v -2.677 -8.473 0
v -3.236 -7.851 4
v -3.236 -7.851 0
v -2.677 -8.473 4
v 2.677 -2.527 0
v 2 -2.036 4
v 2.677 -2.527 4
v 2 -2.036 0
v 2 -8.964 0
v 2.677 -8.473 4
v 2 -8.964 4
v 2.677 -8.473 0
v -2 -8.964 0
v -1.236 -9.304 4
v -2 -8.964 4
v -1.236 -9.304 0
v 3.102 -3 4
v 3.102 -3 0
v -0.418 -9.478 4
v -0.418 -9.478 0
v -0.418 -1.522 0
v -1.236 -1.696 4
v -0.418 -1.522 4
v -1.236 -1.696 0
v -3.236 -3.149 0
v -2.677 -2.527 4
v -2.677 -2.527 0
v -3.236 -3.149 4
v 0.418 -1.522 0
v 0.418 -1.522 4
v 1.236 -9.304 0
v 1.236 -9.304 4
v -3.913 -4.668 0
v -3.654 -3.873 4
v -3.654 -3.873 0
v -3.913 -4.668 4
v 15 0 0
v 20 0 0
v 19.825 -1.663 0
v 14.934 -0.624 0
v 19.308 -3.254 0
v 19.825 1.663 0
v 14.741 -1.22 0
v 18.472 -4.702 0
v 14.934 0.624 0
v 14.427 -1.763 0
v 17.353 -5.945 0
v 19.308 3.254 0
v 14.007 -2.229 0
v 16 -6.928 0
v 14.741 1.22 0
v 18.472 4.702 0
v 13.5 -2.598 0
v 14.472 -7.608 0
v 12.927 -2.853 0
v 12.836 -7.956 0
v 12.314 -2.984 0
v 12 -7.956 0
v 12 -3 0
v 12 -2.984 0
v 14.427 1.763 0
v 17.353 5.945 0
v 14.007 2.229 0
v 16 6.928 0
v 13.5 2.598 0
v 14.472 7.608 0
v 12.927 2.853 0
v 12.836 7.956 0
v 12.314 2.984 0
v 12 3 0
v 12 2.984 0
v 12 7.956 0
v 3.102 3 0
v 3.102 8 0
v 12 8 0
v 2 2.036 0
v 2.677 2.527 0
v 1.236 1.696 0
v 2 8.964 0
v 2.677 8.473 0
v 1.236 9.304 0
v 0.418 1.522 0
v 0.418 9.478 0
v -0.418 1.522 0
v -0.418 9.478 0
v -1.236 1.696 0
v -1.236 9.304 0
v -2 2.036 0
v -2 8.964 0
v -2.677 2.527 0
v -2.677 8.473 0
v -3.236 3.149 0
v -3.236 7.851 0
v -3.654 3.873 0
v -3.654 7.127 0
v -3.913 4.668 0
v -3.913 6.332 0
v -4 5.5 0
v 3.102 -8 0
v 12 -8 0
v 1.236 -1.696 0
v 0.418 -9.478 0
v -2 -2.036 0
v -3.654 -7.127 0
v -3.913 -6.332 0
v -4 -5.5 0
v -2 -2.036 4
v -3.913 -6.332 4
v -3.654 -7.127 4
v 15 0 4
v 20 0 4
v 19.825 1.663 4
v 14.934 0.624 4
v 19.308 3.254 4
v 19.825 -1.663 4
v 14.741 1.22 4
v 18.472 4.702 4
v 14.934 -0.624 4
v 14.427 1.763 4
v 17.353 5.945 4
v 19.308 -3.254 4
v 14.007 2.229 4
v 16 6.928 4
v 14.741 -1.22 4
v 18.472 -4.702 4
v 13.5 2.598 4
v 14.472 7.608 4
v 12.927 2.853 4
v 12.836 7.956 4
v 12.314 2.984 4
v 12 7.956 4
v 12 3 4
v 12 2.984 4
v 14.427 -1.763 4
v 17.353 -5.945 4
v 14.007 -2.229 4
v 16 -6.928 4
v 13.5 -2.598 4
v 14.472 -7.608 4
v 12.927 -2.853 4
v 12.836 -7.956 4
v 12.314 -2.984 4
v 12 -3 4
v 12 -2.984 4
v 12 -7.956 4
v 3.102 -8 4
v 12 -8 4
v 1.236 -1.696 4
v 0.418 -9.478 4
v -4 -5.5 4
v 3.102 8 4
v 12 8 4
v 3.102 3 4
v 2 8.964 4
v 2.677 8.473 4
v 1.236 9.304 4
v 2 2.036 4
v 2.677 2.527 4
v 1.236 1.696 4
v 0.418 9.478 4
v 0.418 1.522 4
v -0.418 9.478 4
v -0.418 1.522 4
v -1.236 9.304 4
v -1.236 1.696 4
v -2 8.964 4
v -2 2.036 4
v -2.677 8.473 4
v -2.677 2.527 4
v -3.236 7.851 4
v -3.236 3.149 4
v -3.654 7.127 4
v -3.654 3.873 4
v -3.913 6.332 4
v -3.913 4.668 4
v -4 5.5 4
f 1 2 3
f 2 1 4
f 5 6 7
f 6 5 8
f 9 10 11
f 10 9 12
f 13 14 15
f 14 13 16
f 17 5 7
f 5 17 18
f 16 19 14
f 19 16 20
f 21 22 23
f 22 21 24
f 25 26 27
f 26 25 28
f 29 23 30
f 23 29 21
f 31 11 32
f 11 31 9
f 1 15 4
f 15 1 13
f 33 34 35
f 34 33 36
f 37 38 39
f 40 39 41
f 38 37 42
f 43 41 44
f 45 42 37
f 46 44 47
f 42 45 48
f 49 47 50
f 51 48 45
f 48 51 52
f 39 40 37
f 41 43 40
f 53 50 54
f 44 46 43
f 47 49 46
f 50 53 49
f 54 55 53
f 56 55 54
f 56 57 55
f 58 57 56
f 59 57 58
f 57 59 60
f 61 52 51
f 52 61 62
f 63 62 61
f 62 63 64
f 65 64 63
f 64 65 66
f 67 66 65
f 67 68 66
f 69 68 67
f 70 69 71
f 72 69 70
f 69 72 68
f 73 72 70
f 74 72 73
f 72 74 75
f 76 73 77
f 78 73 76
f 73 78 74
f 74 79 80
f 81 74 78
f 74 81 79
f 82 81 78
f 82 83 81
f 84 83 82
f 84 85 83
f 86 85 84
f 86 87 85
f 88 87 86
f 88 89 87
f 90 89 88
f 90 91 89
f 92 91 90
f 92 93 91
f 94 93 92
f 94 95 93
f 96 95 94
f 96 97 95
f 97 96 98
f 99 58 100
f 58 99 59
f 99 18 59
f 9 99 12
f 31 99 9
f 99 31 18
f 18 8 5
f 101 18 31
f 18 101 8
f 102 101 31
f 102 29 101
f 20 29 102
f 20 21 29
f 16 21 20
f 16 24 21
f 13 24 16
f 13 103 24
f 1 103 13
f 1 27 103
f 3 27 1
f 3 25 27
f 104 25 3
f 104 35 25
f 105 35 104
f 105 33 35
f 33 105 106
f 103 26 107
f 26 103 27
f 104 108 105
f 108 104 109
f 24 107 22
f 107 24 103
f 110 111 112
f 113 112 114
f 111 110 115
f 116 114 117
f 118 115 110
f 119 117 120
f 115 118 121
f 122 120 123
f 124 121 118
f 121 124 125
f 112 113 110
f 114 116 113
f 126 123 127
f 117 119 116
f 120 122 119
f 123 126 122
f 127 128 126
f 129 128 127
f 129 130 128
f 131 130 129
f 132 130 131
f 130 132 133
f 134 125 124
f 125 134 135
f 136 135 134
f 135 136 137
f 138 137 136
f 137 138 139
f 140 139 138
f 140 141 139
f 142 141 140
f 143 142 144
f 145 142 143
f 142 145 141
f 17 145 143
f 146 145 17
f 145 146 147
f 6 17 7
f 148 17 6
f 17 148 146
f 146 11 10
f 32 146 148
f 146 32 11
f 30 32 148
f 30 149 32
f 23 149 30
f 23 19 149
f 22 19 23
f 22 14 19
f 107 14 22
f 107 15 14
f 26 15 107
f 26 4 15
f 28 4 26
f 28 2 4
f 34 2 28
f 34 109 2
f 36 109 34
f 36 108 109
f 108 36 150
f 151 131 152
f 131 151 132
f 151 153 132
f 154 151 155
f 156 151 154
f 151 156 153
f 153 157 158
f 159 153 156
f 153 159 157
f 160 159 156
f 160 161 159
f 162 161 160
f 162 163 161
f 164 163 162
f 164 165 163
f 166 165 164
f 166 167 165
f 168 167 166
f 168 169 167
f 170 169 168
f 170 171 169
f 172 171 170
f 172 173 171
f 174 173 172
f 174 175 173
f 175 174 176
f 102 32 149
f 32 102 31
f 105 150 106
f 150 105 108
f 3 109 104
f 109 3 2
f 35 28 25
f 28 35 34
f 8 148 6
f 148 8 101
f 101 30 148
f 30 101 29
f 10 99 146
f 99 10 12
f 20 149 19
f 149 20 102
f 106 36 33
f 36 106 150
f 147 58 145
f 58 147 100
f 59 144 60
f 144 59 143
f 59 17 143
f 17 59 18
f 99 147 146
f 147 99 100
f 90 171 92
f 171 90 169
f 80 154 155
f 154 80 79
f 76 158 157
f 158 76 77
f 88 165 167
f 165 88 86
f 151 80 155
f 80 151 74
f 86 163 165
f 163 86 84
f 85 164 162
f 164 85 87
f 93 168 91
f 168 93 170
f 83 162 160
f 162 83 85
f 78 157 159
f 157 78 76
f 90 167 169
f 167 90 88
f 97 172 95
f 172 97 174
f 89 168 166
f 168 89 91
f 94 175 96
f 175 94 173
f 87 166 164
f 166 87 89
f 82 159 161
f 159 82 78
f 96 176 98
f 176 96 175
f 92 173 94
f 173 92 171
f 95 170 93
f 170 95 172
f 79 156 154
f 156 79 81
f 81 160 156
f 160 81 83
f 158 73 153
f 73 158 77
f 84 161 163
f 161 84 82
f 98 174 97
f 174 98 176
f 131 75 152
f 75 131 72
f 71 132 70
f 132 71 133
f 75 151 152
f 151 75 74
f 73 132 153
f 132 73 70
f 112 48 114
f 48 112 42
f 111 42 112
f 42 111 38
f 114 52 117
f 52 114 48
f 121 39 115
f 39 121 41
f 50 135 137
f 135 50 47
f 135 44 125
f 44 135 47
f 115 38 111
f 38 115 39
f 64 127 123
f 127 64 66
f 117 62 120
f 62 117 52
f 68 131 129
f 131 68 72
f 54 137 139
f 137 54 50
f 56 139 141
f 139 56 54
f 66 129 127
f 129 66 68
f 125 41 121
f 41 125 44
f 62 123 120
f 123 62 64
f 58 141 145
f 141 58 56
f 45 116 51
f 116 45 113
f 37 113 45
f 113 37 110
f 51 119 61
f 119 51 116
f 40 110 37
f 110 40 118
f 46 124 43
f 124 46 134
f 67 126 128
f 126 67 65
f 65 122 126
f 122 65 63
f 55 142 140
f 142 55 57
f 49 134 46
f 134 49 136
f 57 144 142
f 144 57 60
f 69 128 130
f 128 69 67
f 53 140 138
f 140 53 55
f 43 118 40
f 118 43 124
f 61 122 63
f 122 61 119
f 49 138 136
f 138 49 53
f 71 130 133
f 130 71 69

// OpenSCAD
h=4;
knob_size = 4;
arm_len = 10;
arm_thickness = 5;
t=3;

module arm() {
     cylinder(r=knob_size, h=h);
     translate([(knob_size + arm_len) / 2, 0, h/2])
     cube([arm_len, arm_thickness, h], center=true);
}

$fs=0.5;

translate([0, -(knob_size + t / 2), 0]) arm();
translate([0,  (knob_size + t / 2), 0]) arm();

translate([knob_size / 2 + arm_len, 0, 0])
intersection() {
     difference() {
          cylinder(r=arm_thickness + t, h=h);
          translate([0, 0, -0.01])
               cylinder(r=t, h=h + 0.02);
     }

     translate([25, 0, 0])
     cube([50, 50, 50], center=true);
}
